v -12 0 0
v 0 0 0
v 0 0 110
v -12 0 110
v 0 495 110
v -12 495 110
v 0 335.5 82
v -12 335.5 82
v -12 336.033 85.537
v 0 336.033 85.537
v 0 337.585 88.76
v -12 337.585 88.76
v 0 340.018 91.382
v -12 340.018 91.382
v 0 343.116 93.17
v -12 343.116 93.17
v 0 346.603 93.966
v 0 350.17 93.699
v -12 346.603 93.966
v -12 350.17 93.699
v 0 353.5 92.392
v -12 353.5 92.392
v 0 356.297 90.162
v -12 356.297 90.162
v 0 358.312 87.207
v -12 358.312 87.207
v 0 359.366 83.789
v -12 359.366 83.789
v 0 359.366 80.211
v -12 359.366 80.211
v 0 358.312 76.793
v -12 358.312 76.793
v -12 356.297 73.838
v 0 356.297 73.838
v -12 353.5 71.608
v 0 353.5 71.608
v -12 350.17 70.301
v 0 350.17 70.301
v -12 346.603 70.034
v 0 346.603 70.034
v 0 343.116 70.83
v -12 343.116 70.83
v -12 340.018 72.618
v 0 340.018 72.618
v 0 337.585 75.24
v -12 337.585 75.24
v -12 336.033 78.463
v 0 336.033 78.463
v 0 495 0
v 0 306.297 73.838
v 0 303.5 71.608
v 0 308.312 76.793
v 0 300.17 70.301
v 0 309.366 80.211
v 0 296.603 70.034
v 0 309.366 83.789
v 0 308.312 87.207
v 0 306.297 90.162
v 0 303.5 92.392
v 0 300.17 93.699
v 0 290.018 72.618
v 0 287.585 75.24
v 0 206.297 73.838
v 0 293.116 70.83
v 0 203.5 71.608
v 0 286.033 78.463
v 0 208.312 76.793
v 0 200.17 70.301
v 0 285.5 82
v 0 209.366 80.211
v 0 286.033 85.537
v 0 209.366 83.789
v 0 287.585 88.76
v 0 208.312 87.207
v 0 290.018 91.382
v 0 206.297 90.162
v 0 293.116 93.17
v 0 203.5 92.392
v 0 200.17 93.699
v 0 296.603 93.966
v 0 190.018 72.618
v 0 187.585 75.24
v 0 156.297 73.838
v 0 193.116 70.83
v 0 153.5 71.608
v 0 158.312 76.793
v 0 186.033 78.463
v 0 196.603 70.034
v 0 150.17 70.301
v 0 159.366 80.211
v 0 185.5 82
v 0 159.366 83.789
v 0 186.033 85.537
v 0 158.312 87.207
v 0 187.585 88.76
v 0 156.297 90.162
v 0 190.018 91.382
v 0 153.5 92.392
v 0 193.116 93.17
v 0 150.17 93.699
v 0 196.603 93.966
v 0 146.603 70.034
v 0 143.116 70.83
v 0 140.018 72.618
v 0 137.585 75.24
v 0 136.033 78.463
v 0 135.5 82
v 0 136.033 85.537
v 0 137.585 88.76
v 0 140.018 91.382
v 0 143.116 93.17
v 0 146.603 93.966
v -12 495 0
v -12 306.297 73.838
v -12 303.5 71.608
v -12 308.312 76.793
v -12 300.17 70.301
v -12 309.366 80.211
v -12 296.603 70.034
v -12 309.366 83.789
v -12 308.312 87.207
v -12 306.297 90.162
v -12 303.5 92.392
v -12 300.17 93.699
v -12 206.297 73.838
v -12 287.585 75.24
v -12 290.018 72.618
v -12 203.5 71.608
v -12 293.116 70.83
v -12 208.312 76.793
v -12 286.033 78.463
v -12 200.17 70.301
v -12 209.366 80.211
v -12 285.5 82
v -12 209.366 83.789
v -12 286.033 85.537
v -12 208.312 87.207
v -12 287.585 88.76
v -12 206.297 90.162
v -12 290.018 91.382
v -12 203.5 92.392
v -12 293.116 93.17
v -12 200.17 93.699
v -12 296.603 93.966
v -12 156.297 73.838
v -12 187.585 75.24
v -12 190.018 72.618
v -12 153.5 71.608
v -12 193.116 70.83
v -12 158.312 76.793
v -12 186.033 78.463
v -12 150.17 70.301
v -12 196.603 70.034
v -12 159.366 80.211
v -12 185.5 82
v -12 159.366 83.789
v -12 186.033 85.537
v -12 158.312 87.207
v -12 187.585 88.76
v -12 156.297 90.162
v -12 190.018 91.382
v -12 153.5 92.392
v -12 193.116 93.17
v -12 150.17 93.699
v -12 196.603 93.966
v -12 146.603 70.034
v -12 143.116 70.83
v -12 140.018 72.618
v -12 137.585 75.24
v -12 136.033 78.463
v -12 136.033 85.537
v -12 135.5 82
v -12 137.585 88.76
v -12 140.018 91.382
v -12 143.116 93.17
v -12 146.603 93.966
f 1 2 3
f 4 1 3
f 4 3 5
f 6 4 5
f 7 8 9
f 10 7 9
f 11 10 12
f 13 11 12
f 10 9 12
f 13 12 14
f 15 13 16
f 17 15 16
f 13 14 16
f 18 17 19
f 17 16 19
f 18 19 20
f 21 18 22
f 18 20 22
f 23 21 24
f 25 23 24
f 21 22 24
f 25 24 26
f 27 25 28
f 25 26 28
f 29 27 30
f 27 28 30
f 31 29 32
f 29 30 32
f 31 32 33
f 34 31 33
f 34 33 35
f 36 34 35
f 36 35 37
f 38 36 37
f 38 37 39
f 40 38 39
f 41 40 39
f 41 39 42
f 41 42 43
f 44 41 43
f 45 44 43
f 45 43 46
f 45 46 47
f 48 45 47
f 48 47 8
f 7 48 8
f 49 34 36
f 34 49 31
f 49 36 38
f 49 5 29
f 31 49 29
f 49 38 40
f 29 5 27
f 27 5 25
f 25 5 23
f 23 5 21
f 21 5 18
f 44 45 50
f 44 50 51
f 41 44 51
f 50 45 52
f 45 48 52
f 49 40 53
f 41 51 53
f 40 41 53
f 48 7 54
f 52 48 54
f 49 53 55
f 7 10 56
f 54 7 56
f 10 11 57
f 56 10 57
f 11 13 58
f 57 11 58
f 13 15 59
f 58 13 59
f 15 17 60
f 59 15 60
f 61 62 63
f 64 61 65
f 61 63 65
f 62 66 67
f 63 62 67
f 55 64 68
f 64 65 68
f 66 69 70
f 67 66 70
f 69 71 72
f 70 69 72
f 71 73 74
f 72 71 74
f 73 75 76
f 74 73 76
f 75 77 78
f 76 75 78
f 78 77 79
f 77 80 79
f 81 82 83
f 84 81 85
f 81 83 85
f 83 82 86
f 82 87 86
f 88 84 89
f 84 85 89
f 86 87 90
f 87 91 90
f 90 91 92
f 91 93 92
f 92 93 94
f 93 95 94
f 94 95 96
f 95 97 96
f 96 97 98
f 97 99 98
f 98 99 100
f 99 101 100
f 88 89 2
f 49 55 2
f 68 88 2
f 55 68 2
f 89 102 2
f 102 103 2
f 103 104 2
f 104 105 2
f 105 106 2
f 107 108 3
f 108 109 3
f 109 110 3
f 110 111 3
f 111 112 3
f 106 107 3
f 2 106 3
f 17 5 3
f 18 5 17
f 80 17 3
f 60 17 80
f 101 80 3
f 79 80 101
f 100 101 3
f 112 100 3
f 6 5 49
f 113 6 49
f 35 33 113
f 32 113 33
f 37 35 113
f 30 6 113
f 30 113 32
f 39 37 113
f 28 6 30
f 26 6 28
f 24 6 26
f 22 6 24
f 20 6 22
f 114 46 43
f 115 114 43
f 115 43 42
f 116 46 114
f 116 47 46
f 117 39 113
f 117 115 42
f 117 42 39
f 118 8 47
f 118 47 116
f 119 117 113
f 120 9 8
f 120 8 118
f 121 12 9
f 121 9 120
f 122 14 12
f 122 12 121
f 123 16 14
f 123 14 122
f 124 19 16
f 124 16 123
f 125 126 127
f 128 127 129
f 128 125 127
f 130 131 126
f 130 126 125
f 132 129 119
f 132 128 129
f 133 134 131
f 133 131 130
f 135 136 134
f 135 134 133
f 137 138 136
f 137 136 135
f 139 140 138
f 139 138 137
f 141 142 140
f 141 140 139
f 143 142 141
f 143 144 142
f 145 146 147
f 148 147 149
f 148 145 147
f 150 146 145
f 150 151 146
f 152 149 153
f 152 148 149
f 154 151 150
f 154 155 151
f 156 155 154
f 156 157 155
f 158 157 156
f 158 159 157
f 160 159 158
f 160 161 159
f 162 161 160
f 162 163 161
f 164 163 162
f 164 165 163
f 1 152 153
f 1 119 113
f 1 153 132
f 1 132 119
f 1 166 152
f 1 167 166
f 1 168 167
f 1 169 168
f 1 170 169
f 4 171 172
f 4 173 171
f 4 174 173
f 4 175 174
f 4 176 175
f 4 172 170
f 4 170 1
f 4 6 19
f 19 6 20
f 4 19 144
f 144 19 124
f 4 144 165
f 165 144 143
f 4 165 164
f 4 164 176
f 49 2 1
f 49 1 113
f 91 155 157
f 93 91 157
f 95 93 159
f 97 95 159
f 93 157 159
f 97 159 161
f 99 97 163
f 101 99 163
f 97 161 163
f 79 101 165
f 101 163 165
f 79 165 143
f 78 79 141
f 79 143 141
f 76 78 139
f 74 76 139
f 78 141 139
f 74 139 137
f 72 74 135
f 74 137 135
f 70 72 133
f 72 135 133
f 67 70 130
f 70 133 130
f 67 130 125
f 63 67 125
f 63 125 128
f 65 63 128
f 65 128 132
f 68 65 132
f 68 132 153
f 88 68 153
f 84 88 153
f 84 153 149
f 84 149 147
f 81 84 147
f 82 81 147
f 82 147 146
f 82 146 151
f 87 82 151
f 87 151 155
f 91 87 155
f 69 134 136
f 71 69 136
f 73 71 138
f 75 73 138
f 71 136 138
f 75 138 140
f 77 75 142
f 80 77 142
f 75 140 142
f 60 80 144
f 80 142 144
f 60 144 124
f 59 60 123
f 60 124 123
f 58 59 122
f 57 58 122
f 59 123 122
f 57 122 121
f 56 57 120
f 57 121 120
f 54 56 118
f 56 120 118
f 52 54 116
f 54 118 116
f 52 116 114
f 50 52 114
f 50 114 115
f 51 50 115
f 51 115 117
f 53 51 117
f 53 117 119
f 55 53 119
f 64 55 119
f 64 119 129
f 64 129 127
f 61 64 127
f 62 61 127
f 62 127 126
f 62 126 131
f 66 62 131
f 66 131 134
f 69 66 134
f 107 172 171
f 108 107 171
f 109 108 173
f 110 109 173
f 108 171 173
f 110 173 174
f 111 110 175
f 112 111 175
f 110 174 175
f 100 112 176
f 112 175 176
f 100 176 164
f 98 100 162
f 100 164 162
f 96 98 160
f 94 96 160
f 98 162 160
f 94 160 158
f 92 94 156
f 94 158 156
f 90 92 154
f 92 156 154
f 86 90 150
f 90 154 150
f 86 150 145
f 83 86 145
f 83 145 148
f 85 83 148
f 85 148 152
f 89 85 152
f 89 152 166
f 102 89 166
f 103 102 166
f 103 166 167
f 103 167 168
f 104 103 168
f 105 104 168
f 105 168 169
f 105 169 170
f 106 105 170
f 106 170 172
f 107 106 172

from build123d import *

# Parameters (mm, degrees)
PAD_DEPTH    = 12
SKETCH001_R  = 12
POCKET_DEPTH = 20


with BuildPart() as part:
    # Sketch → Pad (new body)
    with BuildSketch(Plane.YZ):
        Polygon((0, 0), (0, 110), (495, 110), (495, 0), (247.5, 0), align=None)
    extrude(amount=-PAD_DEPTH)

    # Sketch001 (on Face7 of Pad) → Pocket (cut)
    with BuildSketch(Plane(origin=(-12, 0, 0), x_dir=(0, -1, 0), z_dir=(-1, 0, 0))):
        with Locations((-197.5, 82)):
            Circle(SKETCH001_R)
        with Locations((-297.5, 82)):
            Circle(SKETCH001_R)
        with Locations((-347.5, 82)):
            Circle(SKETCH001_R)
        with Locations((-147.5, 82)):
            Circle(SKETCH001_R)
    extrude(amount=-POCKET_DEPTH, mode=Mode.SUBTRACT)


solid = part.part
